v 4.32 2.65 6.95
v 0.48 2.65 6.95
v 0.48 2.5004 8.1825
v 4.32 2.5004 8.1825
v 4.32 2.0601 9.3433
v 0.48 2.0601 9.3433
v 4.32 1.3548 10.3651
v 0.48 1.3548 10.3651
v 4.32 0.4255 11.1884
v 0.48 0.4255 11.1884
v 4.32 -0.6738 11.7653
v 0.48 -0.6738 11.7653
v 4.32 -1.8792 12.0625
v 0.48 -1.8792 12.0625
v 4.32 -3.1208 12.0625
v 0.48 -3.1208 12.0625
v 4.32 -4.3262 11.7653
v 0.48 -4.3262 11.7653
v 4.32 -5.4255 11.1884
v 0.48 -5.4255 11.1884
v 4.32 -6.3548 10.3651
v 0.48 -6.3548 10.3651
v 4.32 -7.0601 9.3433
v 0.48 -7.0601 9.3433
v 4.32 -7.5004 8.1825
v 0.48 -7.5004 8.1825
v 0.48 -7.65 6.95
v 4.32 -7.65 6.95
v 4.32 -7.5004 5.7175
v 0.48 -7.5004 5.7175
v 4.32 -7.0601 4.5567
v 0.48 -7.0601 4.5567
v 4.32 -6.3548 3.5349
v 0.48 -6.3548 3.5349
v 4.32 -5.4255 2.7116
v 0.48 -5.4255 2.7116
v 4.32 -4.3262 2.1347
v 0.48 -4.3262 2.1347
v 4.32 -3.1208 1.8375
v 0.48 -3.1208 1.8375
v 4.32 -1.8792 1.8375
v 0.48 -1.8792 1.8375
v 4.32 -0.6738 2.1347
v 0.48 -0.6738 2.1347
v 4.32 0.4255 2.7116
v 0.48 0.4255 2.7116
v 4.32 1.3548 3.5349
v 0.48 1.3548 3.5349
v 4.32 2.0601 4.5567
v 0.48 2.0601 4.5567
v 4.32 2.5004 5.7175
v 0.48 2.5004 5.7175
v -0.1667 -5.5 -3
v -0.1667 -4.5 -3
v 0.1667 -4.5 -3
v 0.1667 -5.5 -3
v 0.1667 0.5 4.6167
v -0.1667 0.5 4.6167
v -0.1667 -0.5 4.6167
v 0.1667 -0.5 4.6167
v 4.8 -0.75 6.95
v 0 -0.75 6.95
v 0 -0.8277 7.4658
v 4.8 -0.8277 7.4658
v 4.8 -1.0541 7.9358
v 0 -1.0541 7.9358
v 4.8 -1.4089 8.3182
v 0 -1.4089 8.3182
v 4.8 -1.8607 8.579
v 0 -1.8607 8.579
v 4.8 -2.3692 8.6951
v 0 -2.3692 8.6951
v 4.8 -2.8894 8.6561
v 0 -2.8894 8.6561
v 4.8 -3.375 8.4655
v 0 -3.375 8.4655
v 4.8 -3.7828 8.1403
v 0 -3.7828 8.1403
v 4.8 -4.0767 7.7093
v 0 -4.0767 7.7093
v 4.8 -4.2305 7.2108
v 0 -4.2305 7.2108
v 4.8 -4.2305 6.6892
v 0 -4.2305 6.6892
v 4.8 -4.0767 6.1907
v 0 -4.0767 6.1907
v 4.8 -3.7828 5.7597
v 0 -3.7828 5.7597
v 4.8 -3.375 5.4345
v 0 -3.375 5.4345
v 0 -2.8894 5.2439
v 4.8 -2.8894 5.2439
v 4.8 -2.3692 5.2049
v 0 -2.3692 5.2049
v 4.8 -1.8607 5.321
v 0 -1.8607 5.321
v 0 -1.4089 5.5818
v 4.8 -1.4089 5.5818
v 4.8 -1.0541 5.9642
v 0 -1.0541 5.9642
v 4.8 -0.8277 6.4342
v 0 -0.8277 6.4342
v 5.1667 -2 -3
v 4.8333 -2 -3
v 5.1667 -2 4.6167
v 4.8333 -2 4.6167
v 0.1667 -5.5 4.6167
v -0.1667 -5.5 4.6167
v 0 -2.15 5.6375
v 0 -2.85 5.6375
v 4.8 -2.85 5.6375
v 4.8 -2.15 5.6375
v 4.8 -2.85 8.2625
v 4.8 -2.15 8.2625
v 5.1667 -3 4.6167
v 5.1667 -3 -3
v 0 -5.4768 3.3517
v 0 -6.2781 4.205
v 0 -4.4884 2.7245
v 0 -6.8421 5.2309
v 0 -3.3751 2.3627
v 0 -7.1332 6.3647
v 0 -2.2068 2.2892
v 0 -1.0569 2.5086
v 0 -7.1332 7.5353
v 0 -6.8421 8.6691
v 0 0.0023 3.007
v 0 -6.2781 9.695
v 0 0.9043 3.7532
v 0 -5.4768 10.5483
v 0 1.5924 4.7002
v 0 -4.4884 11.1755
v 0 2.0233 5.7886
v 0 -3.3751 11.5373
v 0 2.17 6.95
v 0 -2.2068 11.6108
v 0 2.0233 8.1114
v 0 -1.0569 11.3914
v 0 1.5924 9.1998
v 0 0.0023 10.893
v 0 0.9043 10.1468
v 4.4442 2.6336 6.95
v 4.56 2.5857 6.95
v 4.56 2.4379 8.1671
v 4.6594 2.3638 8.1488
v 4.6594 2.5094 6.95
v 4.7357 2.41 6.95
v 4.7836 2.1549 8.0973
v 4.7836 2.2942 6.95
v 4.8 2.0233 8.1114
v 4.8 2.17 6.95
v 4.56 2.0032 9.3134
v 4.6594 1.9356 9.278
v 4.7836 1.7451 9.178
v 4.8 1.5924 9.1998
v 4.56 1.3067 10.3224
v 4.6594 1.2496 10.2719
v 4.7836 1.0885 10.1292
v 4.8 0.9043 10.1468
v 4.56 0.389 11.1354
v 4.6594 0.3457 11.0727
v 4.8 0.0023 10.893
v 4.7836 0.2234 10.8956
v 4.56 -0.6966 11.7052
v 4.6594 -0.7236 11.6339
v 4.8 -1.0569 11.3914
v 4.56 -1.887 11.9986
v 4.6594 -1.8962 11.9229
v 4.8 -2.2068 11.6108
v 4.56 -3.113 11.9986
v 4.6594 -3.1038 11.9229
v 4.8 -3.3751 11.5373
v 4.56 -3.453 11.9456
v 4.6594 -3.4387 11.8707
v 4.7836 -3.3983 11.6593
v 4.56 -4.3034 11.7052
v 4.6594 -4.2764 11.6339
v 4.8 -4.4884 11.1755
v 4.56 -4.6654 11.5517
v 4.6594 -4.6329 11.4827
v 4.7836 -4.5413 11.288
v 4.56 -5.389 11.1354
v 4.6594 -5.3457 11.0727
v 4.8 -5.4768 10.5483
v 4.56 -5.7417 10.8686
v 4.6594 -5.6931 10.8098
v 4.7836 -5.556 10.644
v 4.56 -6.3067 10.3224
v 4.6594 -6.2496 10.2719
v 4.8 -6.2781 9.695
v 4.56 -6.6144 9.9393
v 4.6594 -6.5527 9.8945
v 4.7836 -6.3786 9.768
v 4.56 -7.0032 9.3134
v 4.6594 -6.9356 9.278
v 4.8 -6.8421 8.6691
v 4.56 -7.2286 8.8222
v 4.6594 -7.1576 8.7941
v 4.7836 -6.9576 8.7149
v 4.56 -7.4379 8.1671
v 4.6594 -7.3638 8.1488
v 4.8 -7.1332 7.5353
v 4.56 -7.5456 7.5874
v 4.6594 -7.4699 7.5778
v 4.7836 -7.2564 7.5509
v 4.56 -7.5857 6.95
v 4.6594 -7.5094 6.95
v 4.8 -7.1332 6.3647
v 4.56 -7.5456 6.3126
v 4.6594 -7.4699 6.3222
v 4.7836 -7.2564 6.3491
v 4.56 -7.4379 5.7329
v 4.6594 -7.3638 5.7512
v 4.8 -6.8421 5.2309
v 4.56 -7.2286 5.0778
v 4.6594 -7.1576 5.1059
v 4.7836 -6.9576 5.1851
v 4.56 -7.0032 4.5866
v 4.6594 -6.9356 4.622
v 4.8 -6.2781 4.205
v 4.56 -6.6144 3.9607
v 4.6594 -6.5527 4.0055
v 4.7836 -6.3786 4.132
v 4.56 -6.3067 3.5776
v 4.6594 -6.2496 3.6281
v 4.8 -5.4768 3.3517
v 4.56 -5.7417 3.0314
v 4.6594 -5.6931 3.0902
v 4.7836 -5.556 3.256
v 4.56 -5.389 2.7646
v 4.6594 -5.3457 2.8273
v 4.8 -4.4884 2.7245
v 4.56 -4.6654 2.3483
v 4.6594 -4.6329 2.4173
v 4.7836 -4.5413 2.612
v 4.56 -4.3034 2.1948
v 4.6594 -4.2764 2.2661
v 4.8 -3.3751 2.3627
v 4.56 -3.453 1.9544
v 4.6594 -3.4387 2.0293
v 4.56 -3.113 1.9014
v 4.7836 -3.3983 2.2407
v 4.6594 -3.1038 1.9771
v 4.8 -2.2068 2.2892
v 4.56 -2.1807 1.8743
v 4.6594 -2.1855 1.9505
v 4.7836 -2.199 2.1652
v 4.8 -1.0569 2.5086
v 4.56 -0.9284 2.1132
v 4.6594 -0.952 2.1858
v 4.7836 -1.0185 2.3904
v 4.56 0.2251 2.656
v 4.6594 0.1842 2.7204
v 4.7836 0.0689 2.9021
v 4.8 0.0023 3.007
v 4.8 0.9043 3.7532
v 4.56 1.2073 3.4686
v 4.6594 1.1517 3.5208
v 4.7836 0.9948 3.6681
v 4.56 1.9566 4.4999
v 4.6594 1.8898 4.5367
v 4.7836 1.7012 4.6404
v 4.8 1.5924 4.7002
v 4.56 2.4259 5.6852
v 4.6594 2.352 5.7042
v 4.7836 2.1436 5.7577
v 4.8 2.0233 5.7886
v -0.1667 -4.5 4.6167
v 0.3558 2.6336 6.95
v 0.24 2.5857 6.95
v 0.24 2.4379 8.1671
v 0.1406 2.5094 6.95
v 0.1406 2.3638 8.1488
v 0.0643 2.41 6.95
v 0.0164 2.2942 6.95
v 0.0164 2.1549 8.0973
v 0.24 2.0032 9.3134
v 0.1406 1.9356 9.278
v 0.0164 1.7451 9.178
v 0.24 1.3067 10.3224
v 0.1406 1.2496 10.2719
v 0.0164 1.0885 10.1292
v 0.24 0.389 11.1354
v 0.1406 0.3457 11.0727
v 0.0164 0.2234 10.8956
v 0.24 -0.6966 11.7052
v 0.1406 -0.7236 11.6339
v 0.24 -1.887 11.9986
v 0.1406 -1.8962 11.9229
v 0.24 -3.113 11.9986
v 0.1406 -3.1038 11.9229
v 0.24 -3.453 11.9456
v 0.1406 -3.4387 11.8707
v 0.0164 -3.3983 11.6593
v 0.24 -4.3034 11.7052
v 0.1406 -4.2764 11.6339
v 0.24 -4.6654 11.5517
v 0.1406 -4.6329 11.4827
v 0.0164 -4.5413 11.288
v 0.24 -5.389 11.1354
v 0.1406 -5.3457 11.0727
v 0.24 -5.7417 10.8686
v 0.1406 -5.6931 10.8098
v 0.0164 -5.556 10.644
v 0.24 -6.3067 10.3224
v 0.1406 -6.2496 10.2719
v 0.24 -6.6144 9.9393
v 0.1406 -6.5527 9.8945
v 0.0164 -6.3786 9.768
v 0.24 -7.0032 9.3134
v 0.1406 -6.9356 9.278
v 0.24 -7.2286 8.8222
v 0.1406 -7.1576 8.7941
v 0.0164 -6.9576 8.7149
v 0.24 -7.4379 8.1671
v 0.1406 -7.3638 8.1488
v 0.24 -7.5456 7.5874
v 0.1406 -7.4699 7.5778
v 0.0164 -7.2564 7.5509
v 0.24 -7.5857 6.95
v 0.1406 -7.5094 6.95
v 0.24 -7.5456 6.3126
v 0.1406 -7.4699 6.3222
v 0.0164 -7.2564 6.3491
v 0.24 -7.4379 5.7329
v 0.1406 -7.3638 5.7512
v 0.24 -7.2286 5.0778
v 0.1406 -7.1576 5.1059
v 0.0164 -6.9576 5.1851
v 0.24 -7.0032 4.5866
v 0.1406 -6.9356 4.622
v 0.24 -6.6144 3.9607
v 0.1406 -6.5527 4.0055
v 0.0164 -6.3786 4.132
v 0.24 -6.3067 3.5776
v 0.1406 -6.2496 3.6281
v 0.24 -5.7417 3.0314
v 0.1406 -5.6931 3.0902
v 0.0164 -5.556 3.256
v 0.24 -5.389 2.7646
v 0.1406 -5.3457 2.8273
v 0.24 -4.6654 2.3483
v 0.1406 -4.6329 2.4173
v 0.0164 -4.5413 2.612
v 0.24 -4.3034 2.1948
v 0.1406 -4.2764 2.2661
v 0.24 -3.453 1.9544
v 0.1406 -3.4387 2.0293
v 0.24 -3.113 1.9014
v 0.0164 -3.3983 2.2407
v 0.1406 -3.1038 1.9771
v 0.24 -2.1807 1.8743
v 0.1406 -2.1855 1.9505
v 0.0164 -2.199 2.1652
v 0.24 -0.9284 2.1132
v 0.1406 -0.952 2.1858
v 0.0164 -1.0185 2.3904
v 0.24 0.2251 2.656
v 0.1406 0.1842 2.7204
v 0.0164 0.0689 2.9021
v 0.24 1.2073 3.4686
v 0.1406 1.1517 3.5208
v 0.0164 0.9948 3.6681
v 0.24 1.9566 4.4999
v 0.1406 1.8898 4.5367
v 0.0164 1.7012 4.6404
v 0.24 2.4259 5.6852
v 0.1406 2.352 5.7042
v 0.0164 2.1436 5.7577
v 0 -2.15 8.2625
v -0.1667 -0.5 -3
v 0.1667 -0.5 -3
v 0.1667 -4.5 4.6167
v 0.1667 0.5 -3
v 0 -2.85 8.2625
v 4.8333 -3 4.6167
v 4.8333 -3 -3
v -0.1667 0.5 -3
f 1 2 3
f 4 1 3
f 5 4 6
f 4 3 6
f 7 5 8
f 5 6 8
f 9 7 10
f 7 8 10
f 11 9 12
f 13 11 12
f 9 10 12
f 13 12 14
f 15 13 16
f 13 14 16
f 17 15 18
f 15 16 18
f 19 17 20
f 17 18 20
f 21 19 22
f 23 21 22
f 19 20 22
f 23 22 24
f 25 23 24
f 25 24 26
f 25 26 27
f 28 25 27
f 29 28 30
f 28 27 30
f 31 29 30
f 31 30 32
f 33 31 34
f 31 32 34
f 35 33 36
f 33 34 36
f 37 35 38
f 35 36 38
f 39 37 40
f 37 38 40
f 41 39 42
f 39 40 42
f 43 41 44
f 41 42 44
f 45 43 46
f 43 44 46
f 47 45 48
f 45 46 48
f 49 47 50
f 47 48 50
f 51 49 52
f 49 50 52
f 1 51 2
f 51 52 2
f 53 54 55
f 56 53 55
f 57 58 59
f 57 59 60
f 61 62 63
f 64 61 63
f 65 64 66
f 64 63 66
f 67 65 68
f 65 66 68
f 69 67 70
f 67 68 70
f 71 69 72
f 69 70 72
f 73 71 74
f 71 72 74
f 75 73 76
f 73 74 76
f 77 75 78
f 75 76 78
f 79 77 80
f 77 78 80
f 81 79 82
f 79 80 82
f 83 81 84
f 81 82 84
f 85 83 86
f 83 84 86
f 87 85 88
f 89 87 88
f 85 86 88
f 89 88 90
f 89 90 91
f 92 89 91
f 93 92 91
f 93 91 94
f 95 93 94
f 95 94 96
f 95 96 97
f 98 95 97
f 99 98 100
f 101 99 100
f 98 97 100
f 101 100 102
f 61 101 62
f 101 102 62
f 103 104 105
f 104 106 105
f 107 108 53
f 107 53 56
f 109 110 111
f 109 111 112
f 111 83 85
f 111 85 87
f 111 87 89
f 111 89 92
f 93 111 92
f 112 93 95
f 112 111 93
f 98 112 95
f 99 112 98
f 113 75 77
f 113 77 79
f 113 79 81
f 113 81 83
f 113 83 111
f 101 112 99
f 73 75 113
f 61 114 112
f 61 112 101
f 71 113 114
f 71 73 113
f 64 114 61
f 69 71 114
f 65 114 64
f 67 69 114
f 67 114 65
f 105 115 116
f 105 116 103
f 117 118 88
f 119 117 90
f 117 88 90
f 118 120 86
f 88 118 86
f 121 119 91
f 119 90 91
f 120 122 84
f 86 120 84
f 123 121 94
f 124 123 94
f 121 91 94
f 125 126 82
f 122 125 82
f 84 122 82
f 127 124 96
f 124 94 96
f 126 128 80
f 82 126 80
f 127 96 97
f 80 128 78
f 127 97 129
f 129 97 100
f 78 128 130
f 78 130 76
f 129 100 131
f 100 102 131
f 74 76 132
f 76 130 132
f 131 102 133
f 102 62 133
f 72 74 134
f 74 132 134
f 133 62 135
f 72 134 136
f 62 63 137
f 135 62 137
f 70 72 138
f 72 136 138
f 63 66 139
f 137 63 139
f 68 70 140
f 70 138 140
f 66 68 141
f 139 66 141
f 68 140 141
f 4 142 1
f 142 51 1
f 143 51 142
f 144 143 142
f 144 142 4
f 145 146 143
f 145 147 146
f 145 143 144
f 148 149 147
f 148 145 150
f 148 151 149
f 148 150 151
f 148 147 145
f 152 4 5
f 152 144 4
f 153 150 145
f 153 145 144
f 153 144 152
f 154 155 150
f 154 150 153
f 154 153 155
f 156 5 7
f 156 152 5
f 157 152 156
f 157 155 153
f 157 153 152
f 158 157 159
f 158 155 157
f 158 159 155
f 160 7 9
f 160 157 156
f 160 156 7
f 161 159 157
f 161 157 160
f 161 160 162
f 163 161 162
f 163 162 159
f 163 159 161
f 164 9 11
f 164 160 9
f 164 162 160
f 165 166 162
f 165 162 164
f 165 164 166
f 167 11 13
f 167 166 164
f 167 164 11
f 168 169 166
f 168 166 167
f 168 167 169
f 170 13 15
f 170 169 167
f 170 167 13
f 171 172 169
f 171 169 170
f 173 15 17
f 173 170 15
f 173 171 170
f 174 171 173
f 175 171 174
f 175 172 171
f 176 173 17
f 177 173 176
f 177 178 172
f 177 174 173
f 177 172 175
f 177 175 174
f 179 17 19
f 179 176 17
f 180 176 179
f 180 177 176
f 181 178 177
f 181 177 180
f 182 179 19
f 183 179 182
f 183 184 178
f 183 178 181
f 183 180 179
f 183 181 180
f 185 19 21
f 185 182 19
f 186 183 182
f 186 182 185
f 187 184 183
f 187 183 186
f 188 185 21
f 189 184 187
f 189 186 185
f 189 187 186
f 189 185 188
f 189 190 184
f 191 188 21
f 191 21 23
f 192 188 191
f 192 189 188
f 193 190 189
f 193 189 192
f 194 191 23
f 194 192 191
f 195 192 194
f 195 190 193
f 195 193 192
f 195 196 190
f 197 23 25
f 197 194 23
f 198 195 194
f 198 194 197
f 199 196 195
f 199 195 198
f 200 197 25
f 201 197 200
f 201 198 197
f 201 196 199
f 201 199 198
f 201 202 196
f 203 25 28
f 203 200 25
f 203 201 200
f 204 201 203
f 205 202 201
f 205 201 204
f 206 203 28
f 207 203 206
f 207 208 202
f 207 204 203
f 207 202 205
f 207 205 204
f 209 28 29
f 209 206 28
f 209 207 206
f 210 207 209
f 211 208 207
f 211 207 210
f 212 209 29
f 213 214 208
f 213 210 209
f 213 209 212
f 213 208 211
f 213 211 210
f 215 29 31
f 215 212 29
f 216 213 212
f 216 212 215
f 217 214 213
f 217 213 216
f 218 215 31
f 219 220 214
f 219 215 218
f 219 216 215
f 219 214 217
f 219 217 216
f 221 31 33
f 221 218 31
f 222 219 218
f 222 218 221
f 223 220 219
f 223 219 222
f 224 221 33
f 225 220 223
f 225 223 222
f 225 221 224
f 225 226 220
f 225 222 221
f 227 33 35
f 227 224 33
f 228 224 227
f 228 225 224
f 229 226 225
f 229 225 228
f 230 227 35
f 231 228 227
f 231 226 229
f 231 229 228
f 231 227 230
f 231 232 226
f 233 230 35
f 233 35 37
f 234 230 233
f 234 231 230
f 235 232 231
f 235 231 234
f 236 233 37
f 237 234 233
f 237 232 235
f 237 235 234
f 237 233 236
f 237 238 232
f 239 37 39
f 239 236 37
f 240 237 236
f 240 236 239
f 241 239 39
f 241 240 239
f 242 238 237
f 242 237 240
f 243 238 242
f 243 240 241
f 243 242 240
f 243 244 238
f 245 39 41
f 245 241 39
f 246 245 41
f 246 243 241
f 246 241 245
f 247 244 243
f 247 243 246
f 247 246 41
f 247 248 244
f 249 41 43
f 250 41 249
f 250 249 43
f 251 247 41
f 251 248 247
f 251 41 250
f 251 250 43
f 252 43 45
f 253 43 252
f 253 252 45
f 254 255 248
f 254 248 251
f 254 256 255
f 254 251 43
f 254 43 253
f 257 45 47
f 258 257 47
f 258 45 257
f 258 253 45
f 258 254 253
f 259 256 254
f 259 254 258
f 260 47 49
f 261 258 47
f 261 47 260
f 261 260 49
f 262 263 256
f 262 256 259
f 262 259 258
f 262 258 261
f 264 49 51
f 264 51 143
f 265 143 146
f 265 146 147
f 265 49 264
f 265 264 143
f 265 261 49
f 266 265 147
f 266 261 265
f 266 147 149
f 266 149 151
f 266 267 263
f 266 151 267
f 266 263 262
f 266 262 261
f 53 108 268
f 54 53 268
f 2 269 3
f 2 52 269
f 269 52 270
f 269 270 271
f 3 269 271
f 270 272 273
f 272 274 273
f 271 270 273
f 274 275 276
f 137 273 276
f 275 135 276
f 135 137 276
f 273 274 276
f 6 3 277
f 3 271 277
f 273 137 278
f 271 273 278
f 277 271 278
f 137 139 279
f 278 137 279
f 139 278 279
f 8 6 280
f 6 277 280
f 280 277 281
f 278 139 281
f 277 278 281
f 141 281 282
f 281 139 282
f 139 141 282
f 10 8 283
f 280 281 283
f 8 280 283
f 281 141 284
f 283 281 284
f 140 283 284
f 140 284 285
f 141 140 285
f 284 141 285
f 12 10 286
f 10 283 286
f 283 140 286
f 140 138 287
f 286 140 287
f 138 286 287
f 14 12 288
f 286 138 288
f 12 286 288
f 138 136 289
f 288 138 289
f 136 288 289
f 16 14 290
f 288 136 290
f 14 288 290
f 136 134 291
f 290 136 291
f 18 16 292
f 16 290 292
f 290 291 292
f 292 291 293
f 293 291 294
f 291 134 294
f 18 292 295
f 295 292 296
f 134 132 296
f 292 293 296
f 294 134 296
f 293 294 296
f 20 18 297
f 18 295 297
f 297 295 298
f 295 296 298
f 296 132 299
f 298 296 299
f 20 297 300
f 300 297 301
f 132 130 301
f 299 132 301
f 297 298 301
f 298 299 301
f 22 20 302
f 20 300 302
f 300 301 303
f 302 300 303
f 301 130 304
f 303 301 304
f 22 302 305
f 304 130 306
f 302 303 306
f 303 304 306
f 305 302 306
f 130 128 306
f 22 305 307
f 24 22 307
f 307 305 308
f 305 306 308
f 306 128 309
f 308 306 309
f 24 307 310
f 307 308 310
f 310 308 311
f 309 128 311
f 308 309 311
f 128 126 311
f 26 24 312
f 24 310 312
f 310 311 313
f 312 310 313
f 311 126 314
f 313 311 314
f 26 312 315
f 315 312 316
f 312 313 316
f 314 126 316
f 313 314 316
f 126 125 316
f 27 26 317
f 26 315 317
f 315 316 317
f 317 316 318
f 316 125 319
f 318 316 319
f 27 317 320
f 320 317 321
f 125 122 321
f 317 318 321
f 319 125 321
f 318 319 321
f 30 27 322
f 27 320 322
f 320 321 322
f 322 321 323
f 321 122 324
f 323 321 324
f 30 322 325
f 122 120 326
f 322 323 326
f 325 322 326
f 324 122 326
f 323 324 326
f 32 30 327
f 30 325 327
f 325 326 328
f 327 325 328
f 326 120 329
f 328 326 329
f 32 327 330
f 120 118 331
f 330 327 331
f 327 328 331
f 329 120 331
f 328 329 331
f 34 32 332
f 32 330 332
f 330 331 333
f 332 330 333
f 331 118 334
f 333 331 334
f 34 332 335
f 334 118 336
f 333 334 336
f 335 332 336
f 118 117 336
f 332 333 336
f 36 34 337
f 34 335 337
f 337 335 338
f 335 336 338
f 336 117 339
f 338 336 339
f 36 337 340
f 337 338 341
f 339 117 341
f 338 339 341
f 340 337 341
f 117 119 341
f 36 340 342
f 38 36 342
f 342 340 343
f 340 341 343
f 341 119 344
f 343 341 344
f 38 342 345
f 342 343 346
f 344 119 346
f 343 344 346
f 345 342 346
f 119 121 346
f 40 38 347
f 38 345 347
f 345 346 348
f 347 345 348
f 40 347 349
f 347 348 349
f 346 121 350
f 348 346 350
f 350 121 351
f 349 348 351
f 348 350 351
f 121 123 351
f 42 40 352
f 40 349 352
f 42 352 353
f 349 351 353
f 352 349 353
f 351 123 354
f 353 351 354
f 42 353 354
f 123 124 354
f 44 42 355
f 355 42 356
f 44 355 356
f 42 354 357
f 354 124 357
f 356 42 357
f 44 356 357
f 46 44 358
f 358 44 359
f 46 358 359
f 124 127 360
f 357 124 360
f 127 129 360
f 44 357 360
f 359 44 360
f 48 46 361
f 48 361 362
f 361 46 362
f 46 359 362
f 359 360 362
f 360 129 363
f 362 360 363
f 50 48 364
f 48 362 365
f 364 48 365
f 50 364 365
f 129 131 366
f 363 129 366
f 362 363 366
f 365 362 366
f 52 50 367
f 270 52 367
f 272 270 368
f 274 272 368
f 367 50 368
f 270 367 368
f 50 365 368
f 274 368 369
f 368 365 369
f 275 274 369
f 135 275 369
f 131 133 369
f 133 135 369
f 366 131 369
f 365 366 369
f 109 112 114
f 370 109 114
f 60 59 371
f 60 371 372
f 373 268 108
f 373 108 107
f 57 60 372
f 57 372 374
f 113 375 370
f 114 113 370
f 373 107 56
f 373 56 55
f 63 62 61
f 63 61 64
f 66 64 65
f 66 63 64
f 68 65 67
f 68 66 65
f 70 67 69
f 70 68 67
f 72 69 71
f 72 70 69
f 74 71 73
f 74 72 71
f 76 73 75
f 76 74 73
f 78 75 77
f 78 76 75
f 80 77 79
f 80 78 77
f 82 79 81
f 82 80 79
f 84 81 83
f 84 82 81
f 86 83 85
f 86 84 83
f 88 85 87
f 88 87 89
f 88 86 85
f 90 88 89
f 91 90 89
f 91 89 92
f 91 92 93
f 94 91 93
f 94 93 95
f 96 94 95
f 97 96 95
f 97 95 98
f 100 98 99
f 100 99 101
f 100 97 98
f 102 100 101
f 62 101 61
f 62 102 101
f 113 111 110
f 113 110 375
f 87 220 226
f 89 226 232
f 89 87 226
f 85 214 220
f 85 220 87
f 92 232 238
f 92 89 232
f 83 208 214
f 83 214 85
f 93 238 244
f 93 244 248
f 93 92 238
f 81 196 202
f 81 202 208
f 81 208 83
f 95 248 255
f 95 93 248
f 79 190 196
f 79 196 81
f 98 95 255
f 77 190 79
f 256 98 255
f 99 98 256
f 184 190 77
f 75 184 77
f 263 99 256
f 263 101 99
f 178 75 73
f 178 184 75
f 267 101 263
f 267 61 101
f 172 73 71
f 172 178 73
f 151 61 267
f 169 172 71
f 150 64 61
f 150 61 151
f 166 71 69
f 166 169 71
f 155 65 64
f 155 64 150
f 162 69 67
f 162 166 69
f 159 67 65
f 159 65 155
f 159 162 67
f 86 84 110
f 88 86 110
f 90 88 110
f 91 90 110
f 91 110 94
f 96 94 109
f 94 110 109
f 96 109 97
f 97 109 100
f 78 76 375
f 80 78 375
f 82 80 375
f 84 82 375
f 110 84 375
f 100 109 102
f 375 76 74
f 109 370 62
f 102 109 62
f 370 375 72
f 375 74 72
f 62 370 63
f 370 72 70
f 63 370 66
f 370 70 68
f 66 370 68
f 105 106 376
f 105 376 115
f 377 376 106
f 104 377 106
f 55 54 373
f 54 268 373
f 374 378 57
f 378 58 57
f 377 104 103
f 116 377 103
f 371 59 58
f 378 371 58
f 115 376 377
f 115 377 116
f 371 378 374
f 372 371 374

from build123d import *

# Parameters (mm, degrees)
SKETCH001_R       = 1.75
SKETCH001_W       = 0.7
SKETCH001_H       = 2.625
PAD001_DEPTH      = 4.8
SKETCH_R          = 5.15
SKETCH_R_2        = 1.75
PAD_DEPTH         = 4.8
FILLET_R          = 0.48
SKETCH003_W       = 0.333334
SKETCH003_H       = 1
PAD002_DEPTH      = 4.616667
PAD002_DEPTH_BACK = 3


with BuildPart() as pad001:
    # Sketch001 → Pad001 (new body)
    with BuildSketch(Plane.YZ):
        with Locations((-2.5, 6.95)):
            Circle(SKETCH001_R)
        with Locations((-2.5, 6.95)):
            Rectangle(SKETCH001_W, SKETCH001_H, mode=Mode.SUBTRACT)
    extrude(amount=PAD001_DEPTH)


with BuildPart() as fillet_body:
    # Sketch → Pad (new body)
    with BuildSketch(Plane.YZ):
        with Locations((-2.5, 6.95)):
            Circle(SKETCH_R)
        with Locations((-2.5, 6.95)):
            Circle(SKETCH_R_2, mode=Mode.SUBTRACT)
    extrude(amount=PAD_DEPTH)

    # Fillet
    fillet_edges = [fillet_body.edges().sort_by_distance(p)[0] for p in [
        (0, -7.65, 6.95),
        (4.8, -7.65, 6.95),
    ]]
    fillet(fillet_edges, radius=FILLET_R)


with BuildPart() as pad002:
    # Sketch003 → Pad002 (new body, two sides)
    with BuildSketch(Plane.XY) as pad002_sk:
        Rectangle(SKETCH003_W, SKETCH003_H)
        with Locations((5, -2.5)):
            Rectangle(SKETCH003_W, SKETCH003_H)
        with Locations((0, -5)):
            Rectangle(SKETCH003_W, SKETCH003_H)
    extrude(amount=PAD002_DEPTH)
    extrude(pad002_sk.sketch, amount=-PAD002_DEPTH_BACK)


solid = Compound([pad001.part, fillet_body.part, pad002.part])
